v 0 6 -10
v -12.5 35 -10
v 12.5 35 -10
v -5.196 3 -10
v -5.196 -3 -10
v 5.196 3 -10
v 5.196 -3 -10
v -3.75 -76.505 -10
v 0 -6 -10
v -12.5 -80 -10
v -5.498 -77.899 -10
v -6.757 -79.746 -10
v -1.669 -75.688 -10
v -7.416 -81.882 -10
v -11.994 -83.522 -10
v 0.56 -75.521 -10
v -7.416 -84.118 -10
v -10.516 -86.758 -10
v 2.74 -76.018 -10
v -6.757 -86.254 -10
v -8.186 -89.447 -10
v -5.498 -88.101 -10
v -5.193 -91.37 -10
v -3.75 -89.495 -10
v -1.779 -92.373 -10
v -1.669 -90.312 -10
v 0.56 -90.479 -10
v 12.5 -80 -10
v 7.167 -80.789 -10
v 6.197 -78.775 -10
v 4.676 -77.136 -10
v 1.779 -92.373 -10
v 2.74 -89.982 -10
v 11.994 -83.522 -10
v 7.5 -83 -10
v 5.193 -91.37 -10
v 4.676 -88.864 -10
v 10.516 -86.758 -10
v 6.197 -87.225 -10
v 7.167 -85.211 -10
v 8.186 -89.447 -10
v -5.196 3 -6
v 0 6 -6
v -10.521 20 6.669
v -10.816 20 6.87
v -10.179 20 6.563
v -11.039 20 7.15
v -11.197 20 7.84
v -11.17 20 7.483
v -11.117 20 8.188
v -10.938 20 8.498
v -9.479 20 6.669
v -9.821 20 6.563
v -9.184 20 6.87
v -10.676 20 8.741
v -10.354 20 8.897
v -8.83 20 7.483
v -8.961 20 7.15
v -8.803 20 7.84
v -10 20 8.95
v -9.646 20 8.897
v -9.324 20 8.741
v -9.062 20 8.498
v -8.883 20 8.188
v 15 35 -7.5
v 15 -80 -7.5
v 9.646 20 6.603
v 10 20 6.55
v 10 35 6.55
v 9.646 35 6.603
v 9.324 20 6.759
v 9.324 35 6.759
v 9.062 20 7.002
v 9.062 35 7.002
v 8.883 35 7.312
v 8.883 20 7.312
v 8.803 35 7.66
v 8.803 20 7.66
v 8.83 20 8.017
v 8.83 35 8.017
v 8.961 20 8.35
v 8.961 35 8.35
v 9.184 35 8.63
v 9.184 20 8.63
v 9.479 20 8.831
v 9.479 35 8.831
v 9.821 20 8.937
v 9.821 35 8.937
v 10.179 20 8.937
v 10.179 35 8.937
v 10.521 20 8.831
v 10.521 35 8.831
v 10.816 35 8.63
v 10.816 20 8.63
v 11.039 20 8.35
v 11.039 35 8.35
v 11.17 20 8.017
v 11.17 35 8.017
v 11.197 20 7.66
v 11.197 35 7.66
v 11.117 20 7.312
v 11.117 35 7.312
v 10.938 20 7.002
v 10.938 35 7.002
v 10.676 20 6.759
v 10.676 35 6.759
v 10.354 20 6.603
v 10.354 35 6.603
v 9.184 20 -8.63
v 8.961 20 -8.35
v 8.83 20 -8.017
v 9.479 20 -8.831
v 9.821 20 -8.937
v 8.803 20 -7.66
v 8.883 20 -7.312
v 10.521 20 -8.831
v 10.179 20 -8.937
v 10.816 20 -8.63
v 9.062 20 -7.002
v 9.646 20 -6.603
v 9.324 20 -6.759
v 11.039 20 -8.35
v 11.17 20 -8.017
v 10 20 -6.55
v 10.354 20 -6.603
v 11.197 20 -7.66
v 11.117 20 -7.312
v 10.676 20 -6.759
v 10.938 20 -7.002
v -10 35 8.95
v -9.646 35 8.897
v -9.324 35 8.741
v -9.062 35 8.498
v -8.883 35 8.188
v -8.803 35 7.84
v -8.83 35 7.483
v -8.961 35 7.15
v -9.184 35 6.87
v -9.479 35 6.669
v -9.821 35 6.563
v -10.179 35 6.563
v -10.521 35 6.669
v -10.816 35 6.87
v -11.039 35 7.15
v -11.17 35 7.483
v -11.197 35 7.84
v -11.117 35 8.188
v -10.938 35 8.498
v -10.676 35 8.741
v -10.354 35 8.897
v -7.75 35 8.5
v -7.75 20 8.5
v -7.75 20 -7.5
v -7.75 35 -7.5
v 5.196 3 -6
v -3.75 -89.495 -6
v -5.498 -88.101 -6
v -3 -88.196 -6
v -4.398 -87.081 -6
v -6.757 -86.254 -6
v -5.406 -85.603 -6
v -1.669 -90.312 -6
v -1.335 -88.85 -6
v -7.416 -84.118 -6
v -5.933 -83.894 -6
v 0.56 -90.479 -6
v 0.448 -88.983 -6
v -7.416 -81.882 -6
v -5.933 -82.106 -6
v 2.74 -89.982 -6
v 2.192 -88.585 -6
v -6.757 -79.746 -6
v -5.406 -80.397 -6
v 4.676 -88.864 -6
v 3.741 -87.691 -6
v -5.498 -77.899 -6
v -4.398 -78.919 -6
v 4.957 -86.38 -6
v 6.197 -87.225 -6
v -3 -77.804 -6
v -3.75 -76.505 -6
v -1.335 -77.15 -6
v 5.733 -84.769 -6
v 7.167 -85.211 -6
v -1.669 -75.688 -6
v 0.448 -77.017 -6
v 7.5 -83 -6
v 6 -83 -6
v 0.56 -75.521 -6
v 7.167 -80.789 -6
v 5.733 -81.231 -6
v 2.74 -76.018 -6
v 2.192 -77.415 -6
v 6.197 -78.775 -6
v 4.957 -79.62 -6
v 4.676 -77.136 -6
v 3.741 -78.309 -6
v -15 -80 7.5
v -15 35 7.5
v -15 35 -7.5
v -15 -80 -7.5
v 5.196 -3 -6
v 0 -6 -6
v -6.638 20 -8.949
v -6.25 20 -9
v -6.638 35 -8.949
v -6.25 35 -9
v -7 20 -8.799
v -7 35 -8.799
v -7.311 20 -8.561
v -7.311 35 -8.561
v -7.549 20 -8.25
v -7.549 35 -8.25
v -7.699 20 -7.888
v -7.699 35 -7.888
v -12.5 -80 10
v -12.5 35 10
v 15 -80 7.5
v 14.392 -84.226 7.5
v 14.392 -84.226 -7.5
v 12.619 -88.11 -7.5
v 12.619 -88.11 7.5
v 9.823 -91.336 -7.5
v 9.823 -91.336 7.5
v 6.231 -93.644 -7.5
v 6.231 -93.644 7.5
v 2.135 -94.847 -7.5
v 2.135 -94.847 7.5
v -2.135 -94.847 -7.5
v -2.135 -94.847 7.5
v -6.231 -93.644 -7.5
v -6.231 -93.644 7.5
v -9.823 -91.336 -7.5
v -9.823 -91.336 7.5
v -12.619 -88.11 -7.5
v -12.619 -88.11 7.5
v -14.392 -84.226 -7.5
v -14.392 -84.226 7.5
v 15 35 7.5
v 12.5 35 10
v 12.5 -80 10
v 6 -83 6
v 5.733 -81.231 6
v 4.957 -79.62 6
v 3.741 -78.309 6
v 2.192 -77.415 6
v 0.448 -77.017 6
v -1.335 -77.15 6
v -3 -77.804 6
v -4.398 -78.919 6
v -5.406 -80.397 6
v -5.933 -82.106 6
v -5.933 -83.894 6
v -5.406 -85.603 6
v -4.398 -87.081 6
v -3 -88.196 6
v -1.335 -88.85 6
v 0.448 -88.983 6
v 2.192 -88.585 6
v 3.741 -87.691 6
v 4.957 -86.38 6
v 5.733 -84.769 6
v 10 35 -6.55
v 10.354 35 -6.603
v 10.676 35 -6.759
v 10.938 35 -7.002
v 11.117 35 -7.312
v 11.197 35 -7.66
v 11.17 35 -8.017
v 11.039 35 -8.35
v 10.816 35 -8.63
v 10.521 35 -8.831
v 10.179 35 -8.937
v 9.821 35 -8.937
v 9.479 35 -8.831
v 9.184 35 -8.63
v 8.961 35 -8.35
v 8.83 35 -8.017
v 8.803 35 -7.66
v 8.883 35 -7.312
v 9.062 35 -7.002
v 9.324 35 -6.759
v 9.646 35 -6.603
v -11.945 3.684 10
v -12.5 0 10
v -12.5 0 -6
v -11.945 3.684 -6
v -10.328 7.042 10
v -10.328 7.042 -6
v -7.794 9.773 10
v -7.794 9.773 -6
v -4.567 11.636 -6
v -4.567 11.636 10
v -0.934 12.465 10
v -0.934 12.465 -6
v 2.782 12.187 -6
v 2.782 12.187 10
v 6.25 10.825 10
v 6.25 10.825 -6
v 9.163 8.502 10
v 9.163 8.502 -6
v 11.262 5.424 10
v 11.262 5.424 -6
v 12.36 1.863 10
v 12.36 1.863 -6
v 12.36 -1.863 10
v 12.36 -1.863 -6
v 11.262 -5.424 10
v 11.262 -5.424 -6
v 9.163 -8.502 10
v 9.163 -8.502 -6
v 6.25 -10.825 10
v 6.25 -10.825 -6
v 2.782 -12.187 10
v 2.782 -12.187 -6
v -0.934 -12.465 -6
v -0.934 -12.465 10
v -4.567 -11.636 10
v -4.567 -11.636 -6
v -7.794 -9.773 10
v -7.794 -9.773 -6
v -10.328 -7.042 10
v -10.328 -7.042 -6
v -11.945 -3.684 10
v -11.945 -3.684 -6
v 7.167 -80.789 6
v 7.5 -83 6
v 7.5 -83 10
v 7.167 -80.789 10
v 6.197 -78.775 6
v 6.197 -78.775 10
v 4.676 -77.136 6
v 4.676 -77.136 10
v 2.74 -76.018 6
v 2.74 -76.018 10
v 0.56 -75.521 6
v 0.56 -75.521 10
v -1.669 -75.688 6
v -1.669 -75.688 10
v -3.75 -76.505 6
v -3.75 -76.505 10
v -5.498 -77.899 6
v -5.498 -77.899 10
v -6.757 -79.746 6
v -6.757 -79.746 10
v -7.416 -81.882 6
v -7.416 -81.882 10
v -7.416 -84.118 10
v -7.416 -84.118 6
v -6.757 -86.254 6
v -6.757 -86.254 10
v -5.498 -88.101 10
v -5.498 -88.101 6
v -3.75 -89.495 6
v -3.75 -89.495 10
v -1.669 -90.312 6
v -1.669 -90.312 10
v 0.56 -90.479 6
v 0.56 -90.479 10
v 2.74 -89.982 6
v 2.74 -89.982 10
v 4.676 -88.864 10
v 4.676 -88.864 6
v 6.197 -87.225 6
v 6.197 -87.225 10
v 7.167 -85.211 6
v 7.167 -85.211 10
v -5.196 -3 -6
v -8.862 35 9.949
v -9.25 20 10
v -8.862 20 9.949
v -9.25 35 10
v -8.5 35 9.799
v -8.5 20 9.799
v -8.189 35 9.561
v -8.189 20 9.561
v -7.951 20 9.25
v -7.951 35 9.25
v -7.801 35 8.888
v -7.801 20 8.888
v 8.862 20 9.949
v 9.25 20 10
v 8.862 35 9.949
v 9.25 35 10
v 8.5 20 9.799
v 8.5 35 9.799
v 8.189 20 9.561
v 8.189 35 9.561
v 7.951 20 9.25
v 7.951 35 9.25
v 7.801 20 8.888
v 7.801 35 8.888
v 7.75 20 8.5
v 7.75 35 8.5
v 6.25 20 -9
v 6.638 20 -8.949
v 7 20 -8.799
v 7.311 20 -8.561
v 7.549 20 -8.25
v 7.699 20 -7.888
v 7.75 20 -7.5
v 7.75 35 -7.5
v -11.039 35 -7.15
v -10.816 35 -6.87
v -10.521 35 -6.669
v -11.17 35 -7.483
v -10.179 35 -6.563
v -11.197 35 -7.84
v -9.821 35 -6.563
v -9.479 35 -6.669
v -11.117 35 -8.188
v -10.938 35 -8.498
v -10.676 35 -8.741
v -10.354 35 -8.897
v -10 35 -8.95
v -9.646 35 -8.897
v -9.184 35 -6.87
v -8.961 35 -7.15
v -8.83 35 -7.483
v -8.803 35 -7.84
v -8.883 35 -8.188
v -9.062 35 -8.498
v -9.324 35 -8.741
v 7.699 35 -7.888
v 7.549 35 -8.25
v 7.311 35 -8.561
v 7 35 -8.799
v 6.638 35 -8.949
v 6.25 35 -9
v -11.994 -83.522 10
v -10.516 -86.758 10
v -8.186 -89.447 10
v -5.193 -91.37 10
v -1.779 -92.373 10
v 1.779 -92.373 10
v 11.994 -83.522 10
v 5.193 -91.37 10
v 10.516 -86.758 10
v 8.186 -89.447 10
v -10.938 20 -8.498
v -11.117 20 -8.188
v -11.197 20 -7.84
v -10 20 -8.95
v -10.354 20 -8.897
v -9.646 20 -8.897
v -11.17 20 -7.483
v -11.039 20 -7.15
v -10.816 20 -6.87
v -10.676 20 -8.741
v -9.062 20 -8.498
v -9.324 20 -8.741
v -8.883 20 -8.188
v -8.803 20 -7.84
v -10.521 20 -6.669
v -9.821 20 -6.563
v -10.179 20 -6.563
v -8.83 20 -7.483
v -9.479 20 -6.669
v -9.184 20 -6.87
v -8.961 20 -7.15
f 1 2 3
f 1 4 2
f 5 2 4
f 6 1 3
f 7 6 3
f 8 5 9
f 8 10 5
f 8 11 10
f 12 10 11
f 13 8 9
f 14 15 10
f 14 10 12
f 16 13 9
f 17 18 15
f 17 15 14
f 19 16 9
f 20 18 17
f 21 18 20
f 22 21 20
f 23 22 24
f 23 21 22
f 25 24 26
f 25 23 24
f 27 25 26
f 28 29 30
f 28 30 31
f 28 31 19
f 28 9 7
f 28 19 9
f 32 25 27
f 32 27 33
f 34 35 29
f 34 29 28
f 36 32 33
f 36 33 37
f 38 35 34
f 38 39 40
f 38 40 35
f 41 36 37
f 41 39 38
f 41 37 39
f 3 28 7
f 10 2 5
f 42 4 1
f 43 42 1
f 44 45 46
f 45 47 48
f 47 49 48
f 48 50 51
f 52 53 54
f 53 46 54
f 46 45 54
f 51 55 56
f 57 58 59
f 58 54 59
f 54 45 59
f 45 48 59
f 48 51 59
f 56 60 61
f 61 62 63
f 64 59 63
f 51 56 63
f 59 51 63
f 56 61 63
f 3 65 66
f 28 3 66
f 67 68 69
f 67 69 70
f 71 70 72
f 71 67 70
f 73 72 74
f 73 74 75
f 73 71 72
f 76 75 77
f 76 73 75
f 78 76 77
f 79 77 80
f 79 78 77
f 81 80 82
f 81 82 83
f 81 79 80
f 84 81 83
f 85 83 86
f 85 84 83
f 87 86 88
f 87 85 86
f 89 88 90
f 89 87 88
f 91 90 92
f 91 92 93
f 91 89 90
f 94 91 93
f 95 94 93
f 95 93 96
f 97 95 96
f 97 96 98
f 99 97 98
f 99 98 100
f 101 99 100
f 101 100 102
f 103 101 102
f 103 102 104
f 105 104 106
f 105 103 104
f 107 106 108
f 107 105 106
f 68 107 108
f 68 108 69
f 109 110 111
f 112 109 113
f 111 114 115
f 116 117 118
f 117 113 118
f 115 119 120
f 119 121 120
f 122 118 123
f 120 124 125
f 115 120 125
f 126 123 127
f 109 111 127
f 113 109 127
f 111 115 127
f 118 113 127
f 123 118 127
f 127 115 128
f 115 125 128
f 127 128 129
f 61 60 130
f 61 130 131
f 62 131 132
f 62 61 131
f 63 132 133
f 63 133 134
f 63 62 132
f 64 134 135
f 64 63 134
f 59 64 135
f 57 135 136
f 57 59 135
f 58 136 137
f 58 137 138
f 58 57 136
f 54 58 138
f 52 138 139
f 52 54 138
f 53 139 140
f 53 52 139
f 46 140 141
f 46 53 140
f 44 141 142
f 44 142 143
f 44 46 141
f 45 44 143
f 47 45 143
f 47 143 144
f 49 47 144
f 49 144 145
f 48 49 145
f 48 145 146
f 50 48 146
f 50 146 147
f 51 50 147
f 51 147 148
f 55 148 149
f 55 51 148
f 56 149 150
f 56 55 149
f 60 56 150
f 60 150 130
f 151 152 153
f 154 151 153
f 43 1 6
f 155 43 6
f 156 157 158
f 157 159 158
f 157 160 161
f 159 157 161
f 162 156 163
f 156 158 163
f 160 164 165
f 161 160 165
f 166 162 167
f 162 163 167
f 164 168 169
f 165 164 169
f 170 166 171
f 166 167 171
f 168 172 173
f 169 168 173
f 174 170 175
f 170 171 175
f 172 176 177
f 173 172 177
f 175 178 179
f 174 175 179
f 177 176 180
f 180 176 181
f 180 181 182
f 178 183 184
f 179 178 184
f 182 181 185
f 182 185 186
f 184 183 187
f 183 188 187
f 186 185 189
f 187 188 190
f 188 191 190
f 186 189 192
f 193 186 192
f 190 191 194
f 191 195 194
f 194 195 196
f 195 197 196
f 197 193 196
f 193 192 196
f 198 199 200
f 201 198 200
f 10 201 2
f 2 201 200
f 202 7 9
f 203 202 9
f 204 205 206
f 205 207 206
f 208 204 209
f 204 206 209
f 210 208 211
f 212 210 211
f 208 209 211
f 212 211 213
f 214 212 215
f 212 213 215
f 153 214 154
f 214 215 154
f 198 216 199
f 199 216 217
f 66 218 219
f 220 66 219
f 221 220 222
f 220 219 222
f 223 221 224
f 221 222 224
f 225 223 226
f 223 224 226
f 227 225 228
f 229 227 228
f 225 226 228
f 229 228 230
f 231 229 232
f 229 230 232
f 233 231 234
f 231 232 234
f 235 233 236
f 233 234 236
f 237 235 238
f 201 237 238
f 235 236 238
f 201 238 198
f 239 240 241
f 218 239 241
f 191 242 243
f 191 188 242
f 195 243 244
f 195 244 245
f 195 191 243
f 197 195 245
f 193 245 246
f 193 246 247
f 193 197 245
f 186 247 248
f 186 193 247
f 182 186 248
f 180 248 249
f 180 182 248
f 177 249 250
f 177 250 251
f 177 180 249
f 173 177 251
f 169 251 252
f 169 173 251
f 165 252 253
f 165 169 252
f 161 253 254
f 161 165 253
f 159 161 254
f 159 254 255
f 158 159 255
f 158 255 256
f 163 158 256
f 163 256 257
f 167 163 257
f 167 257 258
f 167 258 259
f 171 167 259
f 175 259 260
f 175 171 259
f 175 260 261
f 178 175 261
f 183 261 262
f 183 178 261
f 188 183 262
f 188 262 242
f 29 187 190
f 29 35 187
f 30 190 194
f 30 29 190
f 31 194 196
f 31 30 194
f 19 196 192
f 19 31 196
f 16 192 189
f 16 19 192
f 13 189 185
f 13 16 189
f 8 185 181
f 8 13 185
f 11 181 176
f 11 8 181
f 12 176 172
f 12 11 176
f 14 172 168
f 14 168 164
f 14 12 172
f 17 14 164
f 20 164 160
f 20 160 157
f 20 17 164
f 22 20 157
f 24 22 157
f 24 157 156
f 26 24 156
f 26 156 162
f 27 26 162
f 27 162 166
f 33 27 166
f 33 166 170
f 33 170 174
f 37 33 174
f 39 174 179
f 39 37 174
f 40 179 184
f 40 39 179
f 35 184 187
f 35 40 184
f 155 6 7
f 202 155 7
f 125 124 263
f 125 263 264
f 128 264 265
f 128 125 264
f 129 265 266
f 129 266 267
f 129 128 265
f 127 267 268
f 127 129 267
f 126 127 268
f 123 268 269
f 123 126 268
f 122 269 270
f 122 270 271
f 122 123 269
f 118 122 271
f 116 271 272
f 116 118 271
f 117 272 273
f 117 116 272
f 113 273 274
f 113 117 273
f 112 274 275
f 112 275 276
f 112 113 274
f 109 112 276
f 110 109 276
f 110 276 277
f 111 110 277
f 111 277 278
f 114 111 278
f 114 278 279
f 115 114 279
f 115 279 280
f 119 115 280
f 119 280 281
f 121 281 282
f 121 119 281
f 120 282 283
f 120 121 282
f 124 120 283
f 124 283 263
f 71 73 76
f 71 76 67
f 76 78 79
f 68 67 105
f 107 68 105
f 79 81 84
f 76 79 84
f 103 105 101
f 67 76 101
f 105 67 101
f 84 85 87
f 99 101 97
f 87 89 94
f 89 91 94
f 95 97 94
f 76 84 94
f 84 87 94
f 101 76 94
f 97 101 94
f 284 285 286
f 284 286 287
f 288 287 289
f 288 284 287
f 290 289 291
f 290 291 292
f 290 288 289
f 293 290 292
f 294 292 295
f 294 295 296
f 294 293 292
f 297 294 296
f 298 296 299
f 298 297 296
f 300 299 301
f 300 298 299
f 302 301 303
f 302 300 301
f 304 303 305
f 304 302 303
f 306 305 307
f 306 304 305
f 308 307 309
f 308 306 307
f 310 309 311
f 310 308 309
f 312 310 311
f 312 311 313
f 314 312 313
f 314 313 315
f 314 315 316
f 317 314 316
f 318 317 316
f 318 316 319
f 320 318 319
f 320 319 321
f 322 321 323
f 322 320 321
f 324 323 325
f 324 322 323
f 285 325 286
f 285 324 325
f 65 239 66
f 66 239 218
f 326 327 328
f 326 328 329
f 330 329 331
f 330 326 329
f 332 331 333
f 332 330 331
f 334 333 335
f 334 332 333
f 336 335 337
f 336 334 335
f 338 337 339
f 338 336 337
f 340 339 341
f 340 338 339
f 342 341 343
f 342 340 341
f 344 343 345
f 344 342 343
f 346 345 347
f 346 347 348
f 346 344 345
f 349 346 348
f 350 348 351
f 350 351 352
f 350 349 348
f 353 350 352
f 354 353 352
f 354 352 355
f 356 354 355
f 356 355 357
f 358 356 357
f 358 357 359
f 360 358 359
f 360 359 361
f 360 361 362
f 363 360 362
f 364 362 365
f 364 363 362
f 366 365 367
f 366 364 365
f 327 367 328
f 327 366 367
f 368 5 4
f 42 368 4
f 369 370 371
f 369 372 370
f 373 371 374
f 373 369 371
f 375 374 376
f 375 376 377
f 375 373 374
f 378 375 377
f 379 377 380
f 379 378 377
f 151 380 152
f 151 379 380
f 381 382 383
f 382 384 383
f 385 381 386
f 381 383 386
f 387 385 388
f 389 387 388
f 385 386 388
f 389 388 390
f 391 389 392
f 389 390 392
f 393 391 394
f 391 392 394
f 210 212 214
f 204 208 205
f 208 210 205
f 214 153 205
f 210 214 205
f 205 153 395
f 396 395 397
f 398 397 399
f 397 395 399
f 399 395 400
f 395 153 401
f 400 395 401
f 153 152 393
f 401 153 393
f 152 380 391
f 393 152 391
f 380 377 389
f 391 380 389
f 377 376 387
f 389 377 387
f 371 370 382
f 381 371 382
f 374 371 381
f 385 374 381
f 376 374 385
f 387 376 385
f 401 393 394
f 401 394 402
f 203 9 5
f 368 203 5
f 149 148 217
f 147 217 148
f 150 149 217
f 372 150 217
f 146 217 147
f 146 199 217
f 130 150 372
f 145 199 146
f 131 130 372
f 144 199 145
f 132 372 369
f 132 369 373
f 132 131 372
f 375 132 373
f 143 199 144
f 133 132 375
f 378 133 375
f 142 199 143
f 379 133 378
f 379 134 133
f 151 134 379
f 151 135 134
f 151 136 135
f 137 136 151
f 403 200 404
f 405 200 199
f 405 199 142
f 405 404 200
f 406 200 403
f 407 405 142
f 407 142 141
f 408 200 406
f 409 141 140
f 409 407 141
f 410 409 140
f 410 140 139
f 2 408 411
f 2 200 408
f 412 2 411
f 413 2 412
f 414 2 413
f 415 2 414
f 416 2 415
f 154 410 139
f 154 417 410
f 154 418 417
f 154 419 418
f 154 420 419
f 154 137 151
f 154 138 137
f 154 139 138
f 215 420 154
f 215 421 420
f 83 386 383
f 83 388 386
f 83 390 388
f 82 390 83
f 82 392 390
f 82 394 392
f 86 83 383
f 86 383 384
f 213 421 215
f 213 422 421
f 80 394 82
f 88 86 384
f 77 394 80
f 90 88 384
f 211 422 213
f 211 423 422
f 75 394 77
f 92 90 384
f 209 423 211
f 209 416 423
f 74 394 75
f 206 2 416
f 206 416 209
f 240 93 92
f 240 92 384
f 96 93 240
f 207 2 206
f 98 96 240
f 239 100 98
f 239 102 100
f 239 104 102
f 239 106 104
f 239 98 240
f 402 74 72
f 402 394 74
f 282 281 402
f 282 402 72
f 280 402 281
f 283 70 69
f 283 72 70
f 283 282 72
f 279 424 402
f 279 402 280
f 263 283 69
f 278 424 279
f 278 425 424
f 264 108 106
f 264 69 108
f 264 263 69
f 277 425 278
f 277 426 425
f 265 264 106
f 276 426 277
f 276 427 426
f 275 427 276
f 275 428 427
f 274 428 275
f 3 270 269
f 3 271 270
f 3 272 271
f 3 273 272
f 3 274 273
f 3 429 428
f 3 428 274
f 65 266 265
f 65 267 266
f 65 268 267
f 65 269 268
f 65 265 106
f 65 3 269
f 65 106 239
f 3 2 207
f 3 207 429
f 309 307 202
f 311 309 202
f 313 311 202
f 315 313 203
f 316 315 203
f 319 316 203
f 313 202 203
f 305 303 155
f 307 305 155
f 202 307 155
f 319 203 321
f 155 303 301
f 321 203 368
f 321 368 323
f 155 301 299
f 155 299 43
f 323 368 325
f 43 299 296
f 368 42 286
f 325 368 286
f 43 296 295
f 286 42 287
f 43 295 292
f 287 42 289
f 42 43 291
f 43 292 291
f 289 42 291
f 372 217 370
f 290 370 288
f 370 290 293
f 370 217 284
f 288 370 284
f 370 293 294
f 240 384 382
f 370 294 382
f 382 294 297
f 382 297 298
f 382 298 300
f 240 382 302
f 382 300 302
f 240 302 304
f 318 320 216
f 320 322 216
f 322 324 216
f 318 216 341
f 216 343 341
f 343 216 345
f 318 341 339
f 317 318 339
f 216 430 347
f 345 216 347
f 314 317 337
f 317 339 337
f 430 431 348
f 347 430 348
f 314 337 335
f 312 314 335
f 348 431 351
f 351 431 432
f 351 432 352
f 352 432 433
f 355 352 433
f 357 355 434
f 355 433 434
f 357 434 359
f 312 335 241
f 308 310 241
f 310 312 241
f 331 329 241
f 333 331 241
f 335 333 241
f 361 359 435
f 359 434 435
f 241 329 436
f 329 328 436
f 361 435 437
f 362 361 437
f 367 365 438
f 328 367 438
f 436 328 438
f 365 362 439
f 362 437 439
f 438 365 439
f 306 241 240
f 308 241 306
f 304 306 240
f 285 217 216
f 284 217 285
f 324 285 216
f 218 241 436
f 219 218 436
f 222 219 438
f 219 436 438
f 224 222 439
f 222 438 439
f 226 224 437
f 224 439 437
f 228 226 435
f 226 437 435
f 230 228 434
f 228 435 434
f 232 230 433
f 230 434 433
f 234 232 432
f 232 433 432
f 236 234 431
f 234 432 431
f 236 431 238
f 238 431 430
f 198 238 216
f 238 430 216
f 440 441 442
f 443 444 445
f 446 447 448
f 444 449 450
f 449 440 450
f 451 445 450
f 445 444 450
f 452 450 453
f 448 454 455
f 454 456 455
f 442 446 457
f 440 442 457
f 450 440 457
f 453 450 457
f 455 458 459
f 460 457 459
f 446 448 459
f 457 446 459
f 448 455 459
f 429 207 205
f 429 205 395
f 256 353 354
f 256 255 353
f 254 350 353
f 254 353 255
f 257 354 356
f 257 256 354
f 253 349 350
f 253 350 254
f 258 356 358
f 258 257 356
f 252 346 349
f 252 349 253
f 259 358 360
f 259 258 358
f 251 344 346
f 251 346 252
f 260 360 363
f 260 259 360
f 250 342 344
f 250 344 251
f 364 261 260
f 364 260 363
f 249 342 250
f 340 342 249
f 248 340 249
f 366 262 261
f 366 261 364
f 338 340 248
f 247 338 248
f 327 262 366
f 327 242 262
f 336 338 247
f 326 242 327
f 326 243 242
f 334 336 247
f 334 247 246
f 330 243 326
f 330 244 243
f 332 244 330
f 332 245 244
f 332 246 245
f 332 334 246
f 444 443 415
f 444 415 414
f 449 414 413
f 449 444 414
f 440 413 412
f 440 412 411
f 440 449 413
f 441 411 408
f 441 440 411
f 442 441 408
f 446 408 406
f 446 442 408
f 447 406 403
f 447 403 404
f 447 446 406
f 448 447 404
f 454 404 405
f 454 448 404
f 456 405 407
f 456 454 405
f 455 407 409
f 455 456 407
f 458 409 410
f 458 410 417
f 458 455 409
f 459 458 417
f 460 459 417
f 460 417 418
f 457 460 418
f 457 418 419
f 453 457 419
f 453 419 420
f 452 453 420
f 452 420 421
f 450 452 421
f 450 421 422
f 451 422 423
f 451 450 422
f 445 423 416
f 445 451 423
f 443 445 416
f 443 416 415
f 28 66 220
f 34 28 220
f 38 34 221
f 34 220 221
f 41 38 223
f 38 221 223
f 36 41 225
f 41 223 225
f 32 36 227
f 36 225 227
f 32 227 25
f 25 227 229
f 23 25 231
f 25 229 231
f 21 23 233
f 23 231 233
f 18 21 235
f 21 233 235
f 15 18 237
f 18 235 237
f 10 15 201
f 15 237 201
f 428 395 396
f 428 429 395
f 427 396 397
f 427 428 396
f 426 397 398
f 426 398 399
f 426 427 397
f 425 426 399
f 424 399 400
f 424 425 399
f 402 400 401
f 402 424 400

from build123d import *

# Parameters (mm, degrees)
SKETCH1_R           = 4
SKETCH1_R_2         = 7.5
BOSS_EXTRUDE1_DEPTH = 10
SKETCH2_R           = 7.5
SKETCH2_R_2         = 6
BOSS_EXTRUDE2_DEPTH = 6
CUT_EXTRUDE2_DEPTH  = 6
SKETCH4_R           = 12.5
CUT_EXTRUDE1_DEPTH  = 16
SKETCH8_W           = 7.25
SKETCH8_H           = 20
SKETCH8_R           = 1.2
BOSS_EXTRUDE3_DEPTH = 15
SKETCH10_W          = 15.5
SKETCH10_H          = 1
BOSS_EXTRUDE4_DEPTH = 15
FILLET1_R           = 1.5
CHAMFER1_SIZE       = 2.5


with BuildPart() as part:
    # Sketch1 → Boss-Extrude1 (new, symmetric)
    with BuildSketch(Plane.XY):
        with BuildLine():
            Line((-15, -80), (-15, 20))
            Line((-15, 20), (15, 20))
            Line((15, 20), (15, -80))
            ThreePointArc((15, -80), (0, -95), (-15, -80))
        make_face()
        Circle(SKETCH1_R, mode=Mode.SUBTRACT)
        with Locations((0, -83)):
            Circle(SKETCH1_R_2, mode=Mode.SUBTRACT)
    extrude(amount=BOSS_EXTRUDE1_DEPTH, both=True)

    # Sketch2 → Boss-Extrude2 (add, symmetric)
    with BuildSketch(Plane.XY):
        with Locations((0, -83)):
            Circle(SKETCH2_R)
        with Locations((0, -83)):
            Circle(SKETCH2_R_2, mode=Mode.SUBTRACT)
    extrude(amount=BOSS_EXTRUDE2_DEPTH, both=True)

    # Sketch11 → Cut-Extrude2 (cut)
    with BuildSketch(Plane(origin=(0, 0, -10), x_dir=(-1, 0, 0), z_dir=(0, 0, -1))):
        Polygon((0, 6), (-5.196152423, 3), (-5.196152423, -3), (0, -6), (5.196152423, -3), (5.196152423, 3), align=None)
    extrude(amount=-CUT_EXTRUDE2_DEPTH, mode=Mode.SUBTRACT)

    # Sketch4 → Cut-Extrude1 (cut)
    with BuildSketch(Plane(origin=(0, 0, 10), x_dir=(-1, 0, 0), z_dir=(0, 0, -1))):
        Circle(SKETCH4_R)
    extrude(amount=CUT_EXTRUDE1_DEPTH, mode=Mode.SUBTRACT)

    # Sketch8 → Boss-Extrude3 (add)
    # profile 1 of 2: a face of its own
    with BuildSketch(Plane(origin=(0, 20, 0), x_dir=(1, 0, 0), z_dir=(0, 1, 0))):
        with Locations((-11.375, 0)):
            Rectangle(SKETCH8_W, SKETCH8_H)
        with Locations(Location((-10, -7.75, 0), (0, 0, 270))):
            Circle(SKETCH8_R, mode=Mode.SUBTRACT)
        with Locations(Location((-10, 7.75, 0), (0, 0, 90))):
            Circle(SKETCH8_R, mode=Mode.SUBTRACT)
    # profile 2 of 2: a face of its own
    with BuildSketch(Plane(origin=(0, 20, 0), x_dir=(1, 0, 0), z_dir=(0, 1, 0))):
        with Locations((11.375, 0)):
            Rectangle(SKETCH8_W, SKETCH8_H)
        with Locations(Location((10, -7.75, 0), (0, 0, 90))):
            Circle(SKETCH8_R, mode=Mode.SUBTRACT)
        with Locations(Location((10, 7.75, 0), (0, 0, 270))):
            Circle(SKETCH8_R, mode=Mode.SUBTRACT)
    extrude(amount=BOSS_EXTRUDE3_DEPTH)

    # Sketch10 → Boss-Extrude4 (add)
    with BuildSketch(Plane(origin=(0, 20, 0), x_dir=(1, 0, 0), z_dir=(0, 1, 0))):
        with Locations((0, 9.5)):
            Rectangle(SKETCH10_W, SKETCH10_H)
    extrude(amount=BOSS_EXTRUDE4_DEPTH)

    # Fillet1
    fillet1_edges = [part.edges().sort_by_distance(p)[0] for p in [
        (-7.75, 27.5, -9),
        (7.75, 27.5, -9),
        (-7.75, 27.5, 10),
        (7.75, 27.5, 10),
    ]]
    fillet(fillet1_edges, radius=FILLET1_R)

    # Chamfer1
    chamfer1_edges = [part.edges().sort_by_distance(p)[0] for p in [
        (-15, -22.5, 10),
        (0, -95, 10),
        (15, -22.5, 10),
        (15, -22.5, -10),
        (0, -95, -10),
        (-15, -22.5, -10),
    ]]
    chamfer(chamfer1_edges, length=CHAMFER1_SIZE - 0.0001)  # a hair under: the kernel refuses the full size


solid = part.part
